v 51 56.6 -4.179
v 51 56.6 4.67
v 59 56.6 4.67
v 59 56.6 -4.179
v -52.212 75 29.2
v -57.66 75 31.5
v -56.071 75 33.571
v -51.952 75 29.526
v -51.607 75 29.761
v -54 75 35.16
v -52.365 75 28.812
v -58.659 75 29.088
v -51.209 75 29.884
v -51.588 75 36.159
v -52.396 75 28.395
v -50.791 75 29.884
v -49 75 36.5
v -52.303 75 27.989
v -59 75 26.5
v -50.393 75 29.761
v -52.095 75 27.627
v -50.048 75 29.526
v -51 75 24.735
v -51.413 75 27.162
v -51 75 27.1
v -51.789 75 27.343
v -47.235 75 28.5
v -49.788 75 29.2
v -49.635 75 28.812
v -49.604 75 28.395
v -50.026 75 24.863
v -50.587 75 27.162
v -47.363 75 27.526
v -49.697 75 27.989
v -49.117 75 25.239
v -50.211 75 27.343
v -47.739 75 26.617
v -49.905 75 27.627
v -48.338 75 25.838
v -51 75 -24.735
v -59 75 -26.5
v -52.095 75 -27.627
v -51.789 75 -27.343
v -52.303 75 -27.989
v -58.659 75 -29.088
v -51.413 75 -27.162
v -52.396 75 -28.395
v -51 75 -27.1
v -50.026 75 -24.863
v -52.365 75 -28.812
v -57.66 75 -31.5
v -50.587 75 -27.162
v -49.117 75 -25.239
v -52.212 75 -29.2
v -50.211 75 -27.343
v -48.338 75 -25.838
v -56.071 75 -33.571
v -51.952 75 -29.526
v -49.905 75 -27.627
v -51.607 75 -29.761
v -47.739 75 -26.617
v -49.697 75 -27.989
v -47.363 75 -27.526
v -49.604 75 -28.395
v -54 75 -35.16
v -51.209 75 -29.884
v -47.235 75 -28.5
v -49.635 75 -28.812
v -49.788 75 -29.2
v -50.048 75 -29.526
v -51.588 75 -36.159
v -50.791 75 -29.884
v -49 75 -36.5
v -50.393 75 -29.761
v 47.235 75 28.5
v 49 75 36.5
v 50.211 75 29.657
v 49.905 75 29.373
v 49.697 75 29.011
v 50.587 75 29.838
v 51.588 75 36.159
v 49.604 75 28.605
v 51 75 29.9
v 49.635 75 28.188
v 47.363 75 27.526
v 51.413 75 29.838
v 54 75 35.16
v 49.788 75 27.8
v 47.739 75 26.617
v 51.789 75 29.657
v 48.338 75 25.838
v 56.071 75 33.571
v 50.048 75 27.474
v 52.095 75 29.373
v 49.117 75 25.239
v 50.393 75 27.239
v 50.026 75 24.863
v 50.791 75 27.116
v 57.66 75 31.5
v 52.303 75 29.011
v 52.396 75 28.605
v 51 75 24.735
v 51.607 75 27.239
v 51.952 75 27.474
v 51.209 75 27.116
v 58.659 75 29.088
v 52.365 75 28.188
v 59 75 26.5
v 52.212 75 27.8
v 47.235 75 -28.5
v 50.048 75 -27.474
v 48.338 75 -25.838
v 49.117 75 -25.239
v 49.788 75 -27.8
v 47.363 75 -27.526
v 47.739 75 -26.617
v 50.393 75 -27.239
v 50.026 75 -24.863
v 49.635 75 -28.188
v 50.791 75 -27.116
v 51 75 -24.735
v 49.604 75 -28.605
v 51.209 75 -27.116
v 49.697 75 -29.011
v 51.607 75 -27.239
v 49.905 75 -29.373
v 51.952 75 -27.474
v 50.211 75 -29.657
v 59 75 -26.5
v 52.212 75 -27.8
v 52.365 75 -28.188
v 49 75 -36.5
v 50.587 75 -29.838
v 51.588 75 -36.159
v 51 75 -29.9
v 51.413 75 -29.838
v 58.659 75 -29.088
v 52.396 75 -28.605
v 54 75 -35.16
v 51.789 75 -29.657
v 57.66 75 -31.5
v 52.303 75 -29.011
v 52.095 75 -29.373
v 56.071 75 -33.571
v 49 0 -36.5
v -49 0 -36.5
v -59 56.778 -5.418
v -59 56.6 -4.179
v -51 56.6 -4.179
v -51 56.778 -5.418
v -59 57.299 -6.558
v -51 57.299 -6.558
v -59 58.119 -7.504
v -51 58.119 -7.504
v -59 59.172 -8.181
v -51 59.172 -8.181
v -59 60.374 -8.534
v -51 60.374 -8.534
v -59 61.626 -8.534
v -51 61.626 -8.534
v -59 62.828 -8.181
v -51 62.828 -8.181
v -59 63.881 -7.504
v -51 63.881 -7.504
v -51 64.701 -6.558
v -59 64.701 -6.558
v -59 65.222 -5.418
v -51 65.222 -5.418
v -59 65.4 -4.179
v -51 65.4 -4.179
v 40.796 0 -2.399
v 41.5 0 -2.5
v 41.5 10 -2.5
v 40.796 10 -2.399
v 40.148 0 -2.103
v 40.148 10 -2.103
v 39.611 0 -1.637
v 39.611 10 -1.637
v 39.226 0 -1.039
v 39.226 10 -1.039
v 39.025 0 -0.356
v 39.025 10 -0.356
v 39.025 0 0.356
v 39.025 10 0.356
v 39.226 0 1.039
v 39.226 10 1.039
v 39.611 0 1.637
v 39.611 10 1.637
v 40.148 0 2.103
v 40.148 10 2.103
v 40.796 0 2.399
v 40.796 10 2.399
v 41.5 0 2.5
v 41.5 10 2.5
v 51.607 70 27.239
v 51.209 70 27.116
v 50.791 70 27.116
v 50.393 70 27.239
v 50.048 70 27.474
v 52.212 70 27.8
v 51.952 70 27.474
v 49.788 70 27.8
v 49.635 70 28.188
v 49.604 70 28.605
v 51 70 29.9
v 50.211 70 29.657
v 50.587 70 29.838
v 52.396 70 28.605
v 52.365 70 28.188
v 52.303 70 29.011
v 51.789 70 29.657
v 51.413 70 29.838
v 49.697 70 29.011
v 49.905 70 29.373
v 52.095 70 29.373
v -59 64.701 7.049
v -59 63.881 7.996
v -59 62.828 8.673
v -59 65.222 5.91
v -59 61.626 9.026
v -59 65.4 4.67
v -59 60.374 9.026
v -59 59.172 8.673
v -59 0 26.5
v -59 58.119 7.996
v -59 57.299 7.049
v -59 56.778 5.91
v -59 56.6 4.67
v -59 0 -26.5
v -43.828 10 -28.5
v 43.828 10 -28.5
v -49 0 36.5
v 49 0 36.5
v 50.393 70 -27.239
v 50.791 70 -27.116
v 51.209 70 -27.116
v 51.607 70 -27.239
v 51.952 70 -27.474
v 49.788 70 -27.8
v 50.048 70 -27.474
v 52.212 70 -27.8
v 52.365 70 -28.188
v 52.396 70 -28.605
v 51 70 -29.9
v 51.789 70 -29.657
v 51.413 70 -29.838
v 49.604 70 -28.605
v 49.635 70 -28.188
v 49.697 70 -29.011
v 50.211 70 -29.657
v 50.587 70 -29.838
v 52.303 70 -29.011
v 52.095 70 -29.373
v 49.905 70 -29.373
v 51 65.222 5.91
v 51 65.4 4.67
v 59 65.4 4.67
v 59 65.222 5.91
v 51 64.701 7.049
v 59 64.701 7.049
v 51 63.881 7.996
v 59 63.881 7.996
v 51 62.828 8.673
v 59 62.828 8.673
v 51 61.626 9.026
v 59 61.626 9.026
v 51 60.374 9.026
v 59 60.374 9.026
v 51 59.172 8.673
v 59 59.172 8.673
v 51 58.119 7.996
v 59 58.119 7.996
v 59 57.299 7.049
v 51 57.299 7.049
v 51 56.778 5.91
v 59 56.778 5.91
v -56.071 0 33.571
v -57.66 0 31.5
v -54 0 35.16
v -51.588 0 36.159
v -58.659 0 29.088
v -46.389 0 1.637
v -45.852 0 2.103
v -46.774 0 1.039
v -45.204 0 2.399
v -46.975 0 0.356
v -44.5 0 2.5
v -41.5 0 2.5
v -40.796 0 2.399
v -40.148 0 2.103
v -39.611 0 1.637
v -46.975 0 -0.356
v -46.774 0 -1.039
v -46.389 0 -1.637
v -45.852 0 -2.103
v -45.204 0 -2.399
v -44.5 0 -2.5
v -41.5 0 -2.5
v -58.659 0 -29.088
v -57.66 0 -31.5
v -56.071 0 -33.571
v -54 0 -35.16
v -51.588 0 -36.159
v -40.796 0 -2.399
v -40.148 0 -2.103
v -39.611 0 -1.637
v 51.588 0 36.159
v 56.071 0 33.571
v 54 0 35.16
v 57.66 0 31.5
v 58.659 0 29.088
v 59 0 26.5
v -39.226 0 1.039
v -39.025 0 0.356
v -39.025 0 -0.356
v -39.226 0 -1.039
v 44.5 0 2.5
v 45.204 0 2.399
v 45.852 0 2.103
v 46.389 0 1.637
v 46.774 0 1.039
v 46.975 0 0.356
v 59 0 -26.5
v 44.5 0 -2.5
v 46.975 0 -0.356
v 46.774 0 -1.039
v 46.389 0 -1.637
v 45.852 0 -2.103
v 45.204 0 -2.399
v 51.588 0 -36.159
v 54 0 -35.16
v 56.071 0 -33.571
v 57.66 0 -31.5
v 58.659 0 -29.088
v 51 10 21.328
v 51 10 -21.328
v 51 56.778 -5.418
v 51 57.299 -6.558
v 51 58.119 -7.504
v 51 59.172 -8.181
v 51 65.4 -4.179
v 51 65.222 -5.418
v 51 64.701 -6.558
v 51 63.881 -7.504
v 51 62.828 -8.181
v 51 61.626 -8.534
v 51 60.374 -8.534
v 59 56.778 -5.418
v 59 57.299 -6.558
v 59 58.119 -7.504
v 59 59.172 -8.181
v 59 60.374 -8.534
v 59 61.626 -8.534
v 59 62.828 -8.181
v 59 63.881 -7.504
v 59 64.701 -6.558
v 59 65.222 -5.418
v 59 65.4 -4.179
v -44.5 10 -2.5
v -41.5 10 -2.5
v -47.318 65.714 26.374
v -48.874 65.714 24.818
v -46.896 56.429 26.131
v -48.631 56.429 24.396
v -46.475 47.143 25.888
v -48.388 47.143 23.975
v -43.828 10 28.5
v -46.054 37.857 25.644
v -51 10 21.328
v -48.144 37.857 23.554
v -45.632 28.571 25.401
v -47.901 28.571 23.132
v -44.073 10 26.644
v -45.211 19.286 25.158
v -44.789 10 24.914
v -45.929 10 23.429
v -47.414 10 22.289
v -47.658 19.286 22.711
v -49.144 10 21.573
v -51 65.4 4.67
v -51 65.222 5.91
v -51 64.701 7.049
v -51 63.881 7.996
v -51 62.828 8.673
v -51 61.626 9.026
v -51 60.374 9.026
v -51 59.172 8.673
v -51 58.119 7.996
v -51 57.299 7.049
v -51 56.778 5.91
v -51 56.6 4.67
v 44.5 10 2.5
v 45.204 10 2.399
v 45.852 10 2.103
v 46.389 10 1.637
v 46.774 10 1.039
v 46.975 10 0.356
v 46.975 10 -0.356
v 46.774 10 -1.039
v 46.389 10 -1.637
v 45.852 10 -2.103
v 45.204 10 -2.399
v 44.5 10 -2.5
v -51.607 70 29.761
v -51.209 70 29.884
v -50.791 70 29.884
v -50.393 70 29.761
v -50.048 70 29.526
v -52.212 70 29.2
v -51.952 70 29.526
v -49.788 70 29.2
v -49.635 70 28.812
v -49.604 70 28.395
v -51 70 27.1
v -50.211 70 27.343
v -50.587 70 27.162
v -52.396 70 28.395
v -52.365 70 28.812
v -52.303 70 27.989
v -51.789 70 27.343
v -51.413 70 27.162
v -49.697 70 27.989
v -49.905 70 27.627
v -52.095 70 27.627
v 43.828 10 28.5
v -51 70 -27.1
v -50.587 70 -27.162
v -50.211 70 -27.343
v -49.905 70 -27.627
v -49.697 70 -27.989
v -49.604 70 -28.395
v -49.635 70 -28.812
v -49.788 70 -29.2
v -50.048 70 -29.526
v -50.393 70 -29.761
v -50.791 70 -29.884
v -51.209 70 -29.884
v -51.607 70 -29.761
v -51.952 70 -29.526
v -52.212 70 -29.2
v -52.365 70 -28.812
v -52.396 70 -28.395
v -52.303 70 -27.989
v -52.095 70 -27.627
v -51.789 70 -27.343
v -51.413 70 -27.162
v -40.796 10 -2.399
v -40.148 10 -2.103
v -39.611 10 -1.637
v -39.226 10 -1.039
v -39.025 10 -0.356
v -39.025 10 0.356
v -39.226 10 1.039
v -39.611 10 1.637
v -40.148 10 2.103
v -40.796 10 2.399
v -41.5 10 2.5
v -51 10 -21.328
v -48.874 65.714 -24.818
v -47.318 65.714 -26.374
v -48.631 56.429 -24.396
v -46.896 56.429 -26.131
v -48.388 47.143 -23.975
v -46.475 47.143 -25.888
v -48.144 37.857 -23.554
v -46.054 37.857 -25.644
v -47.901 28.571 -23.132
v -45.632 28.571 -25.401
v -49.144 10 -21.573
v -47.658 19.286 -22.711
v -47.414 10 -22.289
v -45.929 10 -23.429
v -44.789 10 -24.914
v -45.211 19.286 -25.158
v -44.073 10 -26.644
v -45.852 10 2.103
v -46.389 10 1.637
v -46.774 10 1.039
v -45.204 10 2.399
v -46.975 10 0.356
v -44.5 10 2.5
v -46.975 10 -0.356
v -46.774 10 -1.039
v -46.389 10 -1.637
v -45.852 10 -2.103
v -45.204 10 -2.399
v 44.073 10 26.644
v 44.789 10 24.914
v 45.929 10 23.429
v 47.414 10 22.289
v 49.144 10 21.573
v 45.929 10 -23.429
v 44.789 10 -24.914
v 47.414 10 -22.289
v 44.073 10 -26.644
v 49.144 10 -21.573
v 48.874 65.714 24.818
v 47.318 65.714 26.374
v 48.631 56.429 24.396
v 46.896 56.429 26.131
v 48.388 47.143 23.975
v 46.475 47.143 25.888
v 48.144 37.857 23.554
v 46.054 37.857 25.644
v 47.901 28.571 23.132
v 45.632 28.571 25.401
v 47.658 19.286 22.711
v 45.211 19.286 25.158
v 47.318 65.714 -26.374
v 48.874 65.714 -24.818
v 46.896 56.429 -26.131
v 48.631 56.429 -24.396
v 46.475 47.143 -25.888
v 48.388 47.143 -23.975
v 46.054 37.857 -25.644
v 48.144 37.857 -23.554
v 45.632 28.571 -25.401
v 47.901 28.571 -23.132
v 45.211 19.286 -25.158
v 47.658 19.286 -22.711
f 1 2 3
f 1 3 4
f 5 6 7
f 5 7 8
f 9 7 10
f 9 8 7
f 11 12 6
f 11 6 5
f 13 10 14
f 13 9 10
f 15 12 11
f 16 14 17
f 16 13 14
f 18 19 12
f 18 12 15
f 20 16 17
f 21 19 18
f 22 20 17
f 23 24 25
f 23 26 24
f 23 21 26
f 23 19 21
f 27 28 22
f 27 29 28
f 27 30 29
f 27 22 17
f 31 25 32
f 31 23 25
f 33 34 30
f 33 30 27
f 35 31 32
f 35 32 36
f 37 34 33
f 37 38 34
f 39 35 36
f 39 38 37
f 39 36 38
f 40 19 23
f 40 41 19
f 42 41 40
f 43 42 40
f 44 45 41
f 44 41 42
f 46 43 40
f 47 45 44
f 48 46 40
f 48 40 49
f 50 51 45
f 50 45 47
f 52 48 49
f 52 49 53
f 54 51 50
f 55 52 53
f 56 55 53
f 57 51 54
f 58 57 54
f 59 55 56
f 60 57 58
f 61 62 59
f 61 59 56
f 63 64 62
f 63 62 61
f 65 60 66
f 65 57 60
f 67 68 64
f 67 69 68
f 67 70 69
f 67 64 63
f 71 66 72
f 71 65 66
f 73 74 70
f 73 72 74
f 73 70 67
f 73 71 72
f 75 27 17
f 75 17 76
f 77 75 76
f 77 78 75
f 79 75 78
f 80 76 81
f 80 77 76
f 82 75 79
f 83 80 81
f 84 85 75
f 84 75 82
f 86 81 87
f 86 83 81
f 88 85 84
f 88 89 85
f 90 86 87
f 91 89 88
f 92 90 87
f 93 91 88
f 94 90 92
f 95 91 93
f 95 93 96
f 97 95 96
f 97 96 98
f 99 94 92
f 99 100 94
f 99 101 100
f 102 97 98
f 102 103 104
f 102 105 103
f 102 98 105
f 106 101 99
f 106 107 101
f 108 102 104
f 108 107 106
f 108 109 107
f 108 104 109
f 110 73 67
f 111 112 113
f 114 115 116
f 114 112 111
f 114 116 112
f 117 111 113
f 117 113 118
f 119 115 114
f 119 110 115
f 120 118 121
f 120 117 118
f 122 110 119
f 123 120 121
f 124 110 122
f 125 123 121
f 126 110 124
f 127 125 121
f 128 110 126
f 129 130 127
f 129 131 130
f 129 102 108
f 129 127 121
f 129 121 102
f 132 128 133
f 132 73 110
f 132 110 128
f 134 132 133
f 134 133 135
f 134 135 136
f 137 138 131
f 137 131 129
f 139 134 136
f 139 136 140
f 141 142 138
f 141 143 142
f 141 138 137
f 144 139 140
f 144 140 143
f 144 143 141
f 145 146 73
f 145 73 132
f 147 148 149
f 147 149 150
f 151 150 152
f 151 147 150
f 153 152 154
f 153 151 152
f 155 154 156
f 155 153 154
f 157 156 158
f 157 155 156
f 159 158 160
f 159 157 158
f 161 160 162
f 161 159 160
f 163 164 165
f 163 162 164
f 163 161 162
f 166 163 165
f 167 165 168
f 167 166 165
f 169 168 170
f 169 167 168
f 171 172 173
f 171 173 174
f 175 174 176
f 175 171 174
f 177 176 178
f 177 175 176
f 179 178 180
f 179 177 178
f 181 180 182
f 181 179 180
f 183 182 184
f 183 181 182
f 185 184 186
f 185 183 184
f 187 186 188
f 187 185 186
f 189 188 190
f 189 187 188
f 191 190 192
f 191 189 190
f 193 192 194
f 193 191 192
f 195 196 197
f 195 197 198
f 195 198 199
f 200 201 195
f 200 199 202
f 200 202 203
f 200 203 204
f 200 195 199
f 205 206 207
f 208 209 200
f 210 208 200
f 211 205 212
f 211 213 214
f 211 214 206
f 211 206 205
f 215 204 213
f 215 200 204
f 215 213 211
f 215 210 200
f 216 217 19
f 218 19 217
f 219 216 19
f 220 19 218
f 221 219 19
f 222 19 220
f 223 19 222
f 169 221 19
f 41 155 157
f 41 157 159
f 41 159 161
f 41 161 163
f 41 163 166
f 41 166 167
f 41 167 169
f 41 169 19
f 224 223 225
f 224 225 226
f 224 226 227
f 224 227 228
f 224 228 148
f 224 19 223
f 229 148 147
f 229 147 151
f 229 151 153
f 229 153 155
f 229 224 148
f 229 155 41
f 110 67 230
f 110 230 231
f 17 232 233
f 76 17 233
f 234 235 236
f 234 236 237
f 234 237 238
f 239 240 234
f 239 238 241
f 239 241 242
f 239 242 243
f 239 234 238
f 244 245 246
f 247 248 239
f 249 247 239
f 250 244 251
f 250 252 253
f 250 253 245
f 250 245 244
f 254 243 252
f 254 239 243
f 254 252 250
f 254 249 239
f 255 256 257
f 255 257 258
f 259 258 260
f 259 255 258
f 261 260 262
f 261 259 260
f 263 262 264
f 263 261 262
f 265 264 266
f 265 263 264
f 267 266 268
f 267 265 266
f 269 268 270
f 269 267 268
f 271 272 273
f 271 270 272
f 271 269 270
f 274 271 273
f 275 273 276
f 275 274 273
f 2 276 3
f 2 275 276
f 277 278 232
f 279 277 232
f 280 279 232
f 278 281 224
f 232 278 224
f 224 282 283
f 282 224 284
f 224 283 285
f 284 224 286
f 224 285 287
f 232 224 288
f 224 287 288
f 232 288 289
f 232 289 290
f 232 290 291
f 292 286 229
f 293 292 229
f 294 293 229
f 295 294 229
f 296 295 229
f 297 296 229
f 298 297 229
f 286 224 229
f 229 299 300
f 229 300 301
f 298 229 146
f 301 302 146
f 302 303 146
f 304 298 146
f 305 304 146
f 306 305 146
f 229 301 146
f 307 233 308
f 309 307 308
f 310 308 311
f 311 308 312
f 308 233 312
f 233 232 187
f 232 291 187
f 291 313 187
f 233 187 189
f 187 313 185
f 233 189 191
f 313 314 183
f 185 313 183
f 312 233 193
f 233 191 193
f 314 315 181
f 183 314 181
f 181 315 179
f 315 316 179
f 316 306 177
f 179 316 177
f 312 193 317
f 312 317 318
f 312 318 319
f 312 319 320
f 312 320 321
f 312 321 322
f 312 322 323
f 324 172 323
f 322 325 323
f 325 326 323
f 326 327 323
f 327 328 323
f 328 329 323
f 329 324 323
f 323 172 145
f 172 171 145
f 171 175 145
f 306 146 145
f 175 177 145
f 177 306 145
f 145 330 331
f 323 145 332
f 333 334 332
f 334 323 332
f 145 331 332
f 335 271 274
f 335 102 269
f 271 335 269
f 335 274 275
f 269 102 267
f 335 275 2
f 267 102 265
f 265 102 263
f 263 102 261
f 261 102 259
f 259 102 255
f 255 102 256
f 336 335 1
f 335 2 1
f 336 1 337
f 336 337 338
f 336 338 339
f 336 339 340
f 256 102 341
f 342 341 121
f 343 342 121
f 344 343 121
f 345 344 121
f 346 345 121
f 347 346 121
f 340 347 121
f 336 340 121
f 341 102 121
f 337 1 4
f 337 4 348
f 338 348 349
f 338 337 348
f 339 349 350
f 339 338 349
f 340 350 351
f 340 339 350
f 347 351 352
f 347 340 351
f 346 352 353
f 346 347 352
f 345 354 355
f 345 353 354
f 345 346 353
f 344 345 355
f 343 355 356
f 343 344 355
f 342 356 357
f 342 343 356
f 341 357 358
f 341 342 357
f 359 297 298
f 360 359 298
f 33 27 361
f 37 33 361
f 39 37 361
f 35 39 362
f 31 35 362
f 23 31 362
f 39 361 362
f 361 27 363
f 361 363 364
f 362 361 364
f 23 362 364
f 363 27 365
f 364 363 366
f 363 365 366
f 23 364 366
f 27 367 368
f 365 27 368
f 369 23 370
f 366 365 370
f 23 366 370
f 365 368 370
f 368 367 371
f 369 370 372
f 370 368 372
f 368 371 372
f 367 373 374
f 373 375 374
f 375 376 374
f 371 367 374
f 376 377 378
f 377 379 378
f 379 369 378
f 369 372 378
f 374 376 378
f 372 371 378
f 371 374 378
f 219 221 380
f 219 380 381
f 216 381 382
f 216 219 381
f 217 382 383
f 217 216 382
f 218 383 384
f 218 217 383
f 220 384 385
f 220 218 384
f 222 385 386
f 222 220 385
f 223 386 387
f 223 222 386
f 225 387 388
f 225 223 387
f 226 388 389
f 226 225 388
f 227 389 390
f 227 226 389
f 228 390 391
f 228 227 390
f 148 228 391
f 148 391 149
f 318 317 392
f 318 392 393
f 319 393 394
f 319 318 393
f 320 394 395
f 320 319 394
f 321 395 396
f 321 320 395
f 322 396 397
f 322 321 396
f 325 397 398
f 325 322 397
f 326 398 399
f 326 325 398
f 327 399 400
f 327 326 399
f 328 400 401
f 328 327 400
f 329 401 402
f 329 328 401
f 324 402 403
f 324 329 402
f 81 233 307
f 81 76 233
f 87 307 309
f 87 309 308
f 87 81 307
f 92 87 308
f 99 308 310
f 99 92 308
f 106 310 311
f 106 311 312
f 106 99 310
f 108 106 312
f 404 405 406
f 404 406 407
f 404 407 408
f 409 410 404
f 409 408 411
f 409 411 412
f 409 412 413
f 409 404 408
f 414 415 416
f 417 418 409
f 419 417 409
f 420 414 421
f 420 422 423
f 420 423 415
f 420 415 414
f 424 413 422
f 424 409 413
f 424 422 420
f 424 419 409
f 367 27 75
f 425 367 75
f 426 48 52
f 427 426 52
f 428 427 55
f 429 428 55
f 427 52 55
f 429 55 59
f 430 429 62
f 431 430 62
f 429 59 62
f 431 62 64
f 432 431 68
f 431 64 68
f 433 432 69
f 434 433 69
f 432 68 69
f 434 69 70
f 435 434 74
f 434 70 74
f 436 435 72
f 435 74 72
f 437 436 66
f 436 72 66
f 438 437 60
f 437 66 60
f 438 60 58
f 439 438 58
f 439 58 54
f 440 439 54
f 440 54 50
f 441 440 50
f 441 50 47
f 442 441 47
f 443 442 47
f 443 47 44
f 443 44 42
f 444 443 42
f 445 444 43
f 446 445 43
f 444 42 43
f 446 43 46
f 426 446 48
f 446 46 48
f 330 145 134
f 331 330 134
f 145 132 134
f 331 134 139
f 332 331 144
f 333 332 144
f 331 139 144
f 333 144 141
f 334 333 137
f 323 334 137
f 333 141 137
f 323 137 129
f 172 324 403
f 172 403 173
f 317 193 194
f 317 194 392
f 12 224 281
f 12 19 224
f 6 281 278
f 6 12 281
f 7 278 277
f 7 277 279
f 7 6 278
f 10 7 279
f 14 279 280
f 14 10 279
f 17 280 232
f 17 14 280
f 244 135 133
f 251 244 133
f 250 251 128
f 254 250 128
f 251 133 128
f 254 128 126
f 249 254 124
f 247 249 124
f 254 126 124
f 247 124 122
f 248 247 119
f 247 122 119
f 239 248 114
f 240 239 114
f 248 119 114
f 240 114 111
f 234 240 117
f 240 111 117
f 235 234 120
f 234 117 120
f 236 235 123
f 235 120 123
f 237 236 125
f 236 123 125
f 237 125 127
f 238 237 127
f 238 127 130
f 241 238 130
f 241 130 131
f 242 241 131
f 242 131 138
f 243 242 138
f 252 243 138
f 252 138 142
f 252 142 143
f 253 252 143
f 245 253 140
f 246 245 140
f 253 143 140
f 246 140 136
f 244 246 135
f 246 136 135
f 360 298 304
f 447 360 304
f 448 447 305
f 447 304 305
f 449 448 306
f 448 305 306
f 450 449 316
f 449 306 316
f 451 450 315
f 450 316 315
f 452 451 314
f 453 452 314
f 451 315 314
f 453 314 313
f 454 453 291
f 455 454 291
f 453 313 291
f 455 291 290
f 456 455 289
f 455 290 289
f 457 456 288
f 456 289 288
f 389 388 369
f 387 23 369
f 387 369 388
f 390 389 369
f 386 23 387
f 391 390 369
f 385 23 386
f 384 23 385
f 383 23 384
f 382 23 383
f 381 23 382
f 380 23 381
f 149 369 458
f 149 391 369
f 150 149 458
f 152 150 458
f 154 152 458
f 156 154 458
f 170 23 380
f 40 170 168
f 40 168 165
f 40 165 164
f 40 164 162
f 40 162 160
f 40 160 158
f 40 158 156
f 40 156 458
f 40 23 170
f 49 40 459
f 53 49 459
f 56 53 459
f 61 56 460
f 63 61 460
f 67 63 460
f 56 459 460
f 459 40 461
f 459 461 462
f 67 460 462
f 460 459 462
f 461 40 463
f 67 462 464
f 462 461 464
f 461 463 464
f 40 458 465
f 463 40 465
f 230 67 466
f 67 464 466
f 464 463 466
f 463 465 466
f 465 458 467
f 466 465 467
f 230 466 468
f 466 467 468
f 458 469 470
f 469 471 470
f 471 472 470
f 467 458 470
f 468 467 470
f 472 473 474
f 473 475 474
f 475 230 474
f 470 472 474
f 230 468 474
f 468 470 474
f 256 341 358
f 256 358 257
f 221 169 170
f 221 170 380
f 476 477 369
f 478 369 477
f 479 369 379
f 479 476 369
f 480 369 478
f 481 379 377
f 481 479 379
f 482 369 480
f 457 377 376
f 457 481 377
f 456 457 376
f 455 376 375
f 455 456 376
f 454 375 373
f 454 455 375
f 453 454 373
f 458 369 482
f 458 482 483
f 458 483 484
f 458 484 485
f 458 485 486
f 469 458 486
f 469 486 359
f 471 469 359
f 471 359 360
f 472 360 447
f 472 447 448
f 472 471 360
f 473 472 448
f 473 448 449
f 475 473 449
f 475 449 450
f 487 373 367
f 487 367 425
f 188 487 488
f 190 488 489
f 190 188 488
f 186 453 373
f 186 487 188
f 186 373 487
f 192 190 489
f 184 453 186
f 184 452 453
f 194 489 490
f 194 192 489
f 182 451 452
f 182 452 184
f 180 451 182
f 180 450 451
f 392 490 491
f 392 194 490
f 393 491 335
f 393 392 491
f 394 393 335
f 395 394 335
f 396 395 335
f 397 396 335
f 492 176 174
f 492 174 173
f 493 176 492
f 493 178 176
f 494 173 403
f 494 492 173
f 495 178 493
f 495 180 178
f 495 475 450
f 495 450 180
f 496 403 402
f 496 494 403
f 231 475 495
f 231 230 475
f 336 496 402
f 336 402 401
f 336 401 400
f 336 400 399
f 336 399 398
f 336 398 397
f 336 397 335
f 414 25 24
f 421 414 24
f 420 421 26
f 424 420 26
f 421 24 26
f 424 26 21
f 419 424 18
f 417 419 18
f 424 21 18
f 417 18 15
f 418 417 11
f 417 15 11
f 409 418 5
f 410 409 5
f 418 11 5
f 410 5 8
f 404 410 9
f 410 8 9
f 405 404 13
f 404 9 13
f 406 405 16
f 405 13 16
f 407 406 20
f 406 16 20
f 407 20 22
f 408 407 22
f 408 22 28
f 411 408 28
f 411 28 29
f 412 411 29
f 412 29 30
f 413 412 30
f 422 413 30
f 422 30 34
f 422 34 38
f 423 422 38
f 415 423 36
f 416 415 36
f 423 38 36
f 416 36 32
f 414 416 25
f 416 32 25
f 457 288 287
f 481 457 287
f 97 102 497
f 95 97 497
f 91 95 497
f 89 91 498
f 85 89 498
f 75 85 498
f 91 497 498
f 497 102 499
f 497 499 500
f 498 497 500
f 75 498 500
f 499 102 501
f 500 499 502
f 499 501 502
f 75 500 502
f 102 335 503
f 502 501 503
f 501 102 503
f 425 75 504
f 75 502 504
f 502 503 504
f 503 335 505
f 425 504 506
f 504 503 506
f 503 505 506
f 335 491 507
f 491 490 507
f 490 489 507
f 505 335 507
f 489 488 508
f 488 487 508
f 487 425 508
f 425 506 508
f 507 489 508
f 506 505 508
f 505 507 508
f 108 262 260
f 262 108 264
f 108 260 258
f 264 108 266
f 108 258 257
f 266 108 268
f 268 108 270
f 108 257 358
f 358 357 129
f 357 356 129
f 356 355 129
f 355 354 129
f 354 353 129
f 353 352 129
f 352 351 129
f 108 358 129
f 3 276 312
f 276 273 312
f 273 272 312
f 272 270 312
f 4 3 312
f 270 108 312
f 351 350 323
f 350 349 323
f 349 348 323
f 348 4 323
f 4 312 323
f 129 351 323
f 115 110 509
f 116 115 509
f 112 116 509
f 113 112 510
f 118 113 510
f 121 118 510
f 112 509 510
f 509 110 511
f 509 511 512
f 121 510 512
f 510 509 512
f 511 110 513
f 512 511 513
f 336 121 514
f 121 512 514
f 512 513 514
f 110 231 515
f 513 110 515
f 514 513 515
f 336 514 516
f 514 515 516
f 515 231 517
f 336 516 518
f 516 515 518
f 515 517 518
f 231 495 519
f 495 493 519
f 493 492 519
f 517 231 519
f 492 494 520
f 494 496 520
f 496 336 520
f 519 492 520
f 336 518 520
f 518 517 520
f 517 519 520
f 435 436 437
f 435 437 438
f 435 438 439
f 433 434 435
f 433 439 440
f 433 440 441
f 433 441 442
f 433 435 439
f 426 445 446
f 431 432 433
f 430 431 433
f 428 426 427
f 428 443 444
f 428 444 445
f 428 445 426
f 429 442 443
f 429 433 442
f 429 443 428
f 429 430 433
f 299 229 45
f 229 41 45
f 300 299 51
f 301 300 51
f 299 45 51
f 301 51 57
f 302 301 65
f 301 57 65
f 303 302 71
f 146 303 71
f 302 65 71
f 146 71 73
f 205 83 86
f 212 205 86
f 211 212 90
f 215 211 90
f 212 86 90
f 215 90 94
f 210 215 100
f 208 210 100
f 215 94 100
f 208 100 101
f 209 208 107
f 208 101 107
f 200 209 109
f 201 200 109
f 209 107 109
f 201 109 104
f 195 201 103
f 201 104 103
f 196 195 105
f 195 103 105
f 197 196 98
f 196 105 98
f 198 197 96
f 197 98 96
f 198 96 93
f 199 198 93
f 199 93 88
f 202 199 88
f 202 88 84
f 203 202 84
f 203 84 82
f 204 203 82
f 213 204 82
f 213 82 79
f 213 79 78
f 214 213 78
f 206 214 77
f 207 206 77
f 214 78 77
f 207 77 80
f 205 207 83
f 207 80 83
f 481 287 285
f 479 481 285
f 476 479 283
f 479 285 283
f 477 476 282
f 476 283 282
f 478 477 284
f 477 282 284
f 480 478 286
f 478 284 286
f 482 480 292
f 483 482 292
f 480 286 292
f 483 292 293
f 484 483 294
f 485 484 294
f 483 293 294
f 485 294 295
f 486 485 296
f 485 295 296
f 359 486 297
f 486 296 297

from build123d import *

# Parameters (mm, degrees)
SKETCH1_W                     = 118
SKETCH1_H                     = 73
BOSS_EXTRUDE1_DEPTH           = 75
SKETCH3_W                     = 102
SKETCH3_H                     = 57
CUT_EXTRUDE2_DEPTH            = 65
FILLET1_R                     = 10
CUT_EXTRUDE3_DEPTH            = 103.167754208
SKETCH5_R                     = 7.171572875
BOSS_EXTRUDE2_DEPTH           = 65
BOSS_EXTRUDE2_DRAFT           = 3
BOSS_EXTRUDE2_PROFILE_2_DEPTH = 65
BOSS_EXTRUDE2_PROFILE_2_DRAFT = 3
BOSS_EXTRUDE2_PROFILE_3_DEPTH = 65
BOSS_EXTRUDE2_PROFILE_3_DRAFT = 3
BOSS_EXTRUDE2_PROFILE_4_DEPTH = 65
BOSS_EXTRUDE2_PROFILE_4_DRAFT = 3
SKETCH9_R                     = 1.4
CUT_EXTRUDE6_DEPTH            = 5
CUT_EXTRUDE7_DEPTH            = 10000


with BuildPart() as part:
    # Sketch1 → Boss-Extrude1 (new body)
    with BuildSketch(Plane(origin=(0, 0, 0), x_dir=(1, 0, 0), z_dir=(0, 1, 0))):
        Rectangle(SKETCH1_W, SKETCH1_H)
    extrude(amount=BOSS_EXTRUDE1_DEPTH)

    # Sketch3 → Cut-Extrude2 (cut)
    with BuildSketch(Plane(origin=(0, 75, 0), x_dir=(1, 0, 0), z_dir=(0, 1, 0))):
        Rectangle(SKETCH3_W, SKETCH3_H)
    extrude(amount=-CUT_EXTRUDE2_DEPTH, mode=Mode.SUBTRACT)

    # Fillet1
    fillet1_edges = [part.edges().sort_by_distance(p)[0] for p in [
        (-59, 37.5, -36.5),
        (59, 37.5, -36.5),
        (59, 37.5, 36.5),
        (-59, 37.5, 36.5),
    ]]
    fillet(fillet1_edges, radius=FILLET1_R)

    # Sketch4 → Cut-Extrude3 (cut, through all)
    with BuildSketch(Plane.XZ):
        with BuildLine():
            Line((-44.5, -2.5), (-41.5, -2.5))
            ThreePointArc((-41.5, -2.5), (-39, 0), (-41.5, 2.5))
            Line((-41.5, 2.5), (-44.5, 2.5))
            ThreePointArc((-44.5, 2.5), (-47, 0), (-44.5, -2.5))
        make_face()
        with BuildLine():
            ThreePointArc((41.5, -2.5), (39, 0), (41.5, 2.5))
            Line((41.5, 2.5), (44.5, 2.5))
            ThreePointArc((44.5, 2.5), (47, 0), (44.5, -2.5))
            Line((44.5, -2.5), (41.5, -2.5))
        make_face()
    extrude(amount=-CUT_EXTRUDE3_DEPTH, mode=Mode.SUBTRACT)


with BuildPart() as boss_extrude2_tool:
    # Sketch5 → Boss-Extrude2 (with draft: the straight prism first)
    with BuildSketch(Plane(origin=(0, 10, 0), x_dir=(1, 0, 0), z_dir=(0, 1, 0))):
        with Locations((-51, 28.5)):
            Circle(SKETCH5_R)
    extrude(amount=BOSS_EXTRUDE2_DEPTH)
    # Boss-Extrude2: the draft: its side faces are tilted about the plane it starts from
    boss_extrude2_sides = [boss_extrude2_tool.faces().sort_by_distance(p)[0] for p in [
        (-58.171572875, 42.5, -28.5),
    ]]
    draft(boss_extrude2_sides, Plane(origin=(0, 10, 0), x_dir=(1, 0, 0), z_dir=(0, 1, 0)), BOSS_EXTRUDE2_DRAFT)


with BuildPart() as part_1:
    add(part.part)

    # Boss-Extrude2: add boss_extrude2_tool
    add(boss_extrude2_tool.part)


with BuildPart() as boss_extrude2_profile_2_tool:
    # Sketch5 → Boss-Extrude2 profile 2 (with draft: the straight prism first)
    with BuildSketch(Plane(origin=(0, 10, 0), x_dir=(1, 0, 0), z_dir=(0, 1, 0))):
        with Locations((51, 28.5)):
            Circle(SKETCH5_R)
    extrude(amount=BOSS_EXTRUDE2_PROFILE_2_DEPTH)
    # Boss-Extrude2 profile 2: the draft: its side faces are tilted about the plane it starts from
    boss_extrude2_profile_2_sides = [boss_extrude2_profile_2_tool.faces().sort_by_distance(p)[0] for p in [
        (43.828427125, 42.5, -28.5),
    ]]
    draft(boss_extrude2_profile_2_sides, Plane(origin=(0, 10, 0), x_dir=(1, 0, 0), z_dir=(0, 1, 0)), BOSS_EXTRUDE2_PROFILE_2_DRAFT)


with BuildPart() as part_2:
    add(part_1.part)

    # Boss-Extrude2 profile 2: add boss_extrude2_profile_2_tool
    add(boss_extrude2_profile_2_tool.part)


with BuildPart() as boss_extrude2_profile_3_tool:
    # Sketch5 → Boss-Extrude2 profile 3 (with draft: the straight prism first)
    with BuildSketch(Plane(origin=(0, 10, 0), x_dir=(1, 0, 0), z_dir=(0, 1, 0))):
        with Locations((51, -28.5)):
            Circle(SKETCH5_R)
    extrude(amount=BOSS_EXTRUDE2_PROFILE_3_DEPTH)
    # Boss-Extrude2 profile 3: the draft: its side faces are tilted about the plane it starts from
    boss_extrude2_profile_3_sides = [boss_extrude2_profile_3_tool.faces().sort_by_distance(p)[0] for p in [
        (43.828427125, 42.5, 28.5),
    ]]
    draft(boss_extrude2_profile_3_sides, Plane(origin=(0, 10, 0), x_dir=(1, 0, 0), z_dir=(0, 1, 0)), BOSS_EXTRUDE2_PROFILE_3_DRAFT)


with BuildPart() as part_3:
    add(part_2.part)

    # Boss-Extrude2 profile 3: add boss_extrude2_profile_3_tool
    add(boss_extrude2_profile_3_tool.part)


with BuildPart() as boss_extrude2_profile_4_tool:
    # Sketch5 → Boss-Extrude2 profile 4 (with draft: the straight prism first)
    with BuildSketch(Plane(origin=(0, 10, 0), x_dir=(1, 0, 0), z_dir=(0, 1, 0))):
        with Locations((-51, -28.5)):
            Circle(SKETCH5_R)
    extrude(amount=BOSS_EXTRUDE2_PROFILE_4_DEPTH)
    # Boss-Extrude2 profile 4: the draft: its side faces are tilted about the plane it starts from
    boss_extrude2_profile_4_sides = [boss_extrude2_profile_4_tool.faces().sort_by_distance(p)[0] for p in [
        (-58.171572875, 42.5, 28.5),
    ]]
    draft(boss_extrude2_profile_4_sides, Plane(origin=(0, 10, 0), x_dir=(1, 0, 0), z_dir=(0, 1, 0)), BOSS_EXTRUDE2_PROFILE_4_DRAFT)


with BuildPart() as part_4:
    add(part_3.part)

    # Boss-Extrude2 profile 4: add boss_extrude2_profile_4_tool
    add(boss_extrude2_profile_4_tool.part)

    # Sketch9 → Cut-Extrude6 (cut)
    with BuildSketch(Plane(origin=(0, 75, 0), x_dir=(1, 0, 0), z_dir=(0, 1, 0))):
        with Locations(Location((-51, 28.5, 0), (0, 0, 270))):
            Circle(SKETCH9_R)
        with Locations(Location((51, 28.5, 0), (0, 0, 90))):
            Circle(SKETCH9_R)
        with Locations(Location((51, -28.5, 0), (0, 0, 270))):
            Circle(SKETCH9_R)
        with Locations(Location((-51, -28.5, 0), (0, 0, 90))):
            Circle(SKETCH9_R)
    extrude(amount=-CUT_EXTRUDE6_DEPTH, mode=Mode.SUBTRACT)

    # Sketch13 → Cut-Extrude7 (cut)
    with BuildSketch(Plane.ZY.offset(59)):
        with BuildLine():
            Line((-4.178843904, 65.399928421), (4.670472599, 65.399928421))
            ThreePointArc((4.670472599, 65.399928421), (9.07040102, 61), (4.670472599, 56.600071579))
            Line((4.670472599, 56.600071579), (-4.178843904, 56.600071579))
            ThreePointArc((-4.178843904, 56.600071579), (-8.578772325, 61), (-4.178843904, 65.399928421))
        make_face()
    extrude(amount=-CUT_EXTRUDE7_DEPTH, mode=Mode.SUBTRACT)


solid = part_4.part
